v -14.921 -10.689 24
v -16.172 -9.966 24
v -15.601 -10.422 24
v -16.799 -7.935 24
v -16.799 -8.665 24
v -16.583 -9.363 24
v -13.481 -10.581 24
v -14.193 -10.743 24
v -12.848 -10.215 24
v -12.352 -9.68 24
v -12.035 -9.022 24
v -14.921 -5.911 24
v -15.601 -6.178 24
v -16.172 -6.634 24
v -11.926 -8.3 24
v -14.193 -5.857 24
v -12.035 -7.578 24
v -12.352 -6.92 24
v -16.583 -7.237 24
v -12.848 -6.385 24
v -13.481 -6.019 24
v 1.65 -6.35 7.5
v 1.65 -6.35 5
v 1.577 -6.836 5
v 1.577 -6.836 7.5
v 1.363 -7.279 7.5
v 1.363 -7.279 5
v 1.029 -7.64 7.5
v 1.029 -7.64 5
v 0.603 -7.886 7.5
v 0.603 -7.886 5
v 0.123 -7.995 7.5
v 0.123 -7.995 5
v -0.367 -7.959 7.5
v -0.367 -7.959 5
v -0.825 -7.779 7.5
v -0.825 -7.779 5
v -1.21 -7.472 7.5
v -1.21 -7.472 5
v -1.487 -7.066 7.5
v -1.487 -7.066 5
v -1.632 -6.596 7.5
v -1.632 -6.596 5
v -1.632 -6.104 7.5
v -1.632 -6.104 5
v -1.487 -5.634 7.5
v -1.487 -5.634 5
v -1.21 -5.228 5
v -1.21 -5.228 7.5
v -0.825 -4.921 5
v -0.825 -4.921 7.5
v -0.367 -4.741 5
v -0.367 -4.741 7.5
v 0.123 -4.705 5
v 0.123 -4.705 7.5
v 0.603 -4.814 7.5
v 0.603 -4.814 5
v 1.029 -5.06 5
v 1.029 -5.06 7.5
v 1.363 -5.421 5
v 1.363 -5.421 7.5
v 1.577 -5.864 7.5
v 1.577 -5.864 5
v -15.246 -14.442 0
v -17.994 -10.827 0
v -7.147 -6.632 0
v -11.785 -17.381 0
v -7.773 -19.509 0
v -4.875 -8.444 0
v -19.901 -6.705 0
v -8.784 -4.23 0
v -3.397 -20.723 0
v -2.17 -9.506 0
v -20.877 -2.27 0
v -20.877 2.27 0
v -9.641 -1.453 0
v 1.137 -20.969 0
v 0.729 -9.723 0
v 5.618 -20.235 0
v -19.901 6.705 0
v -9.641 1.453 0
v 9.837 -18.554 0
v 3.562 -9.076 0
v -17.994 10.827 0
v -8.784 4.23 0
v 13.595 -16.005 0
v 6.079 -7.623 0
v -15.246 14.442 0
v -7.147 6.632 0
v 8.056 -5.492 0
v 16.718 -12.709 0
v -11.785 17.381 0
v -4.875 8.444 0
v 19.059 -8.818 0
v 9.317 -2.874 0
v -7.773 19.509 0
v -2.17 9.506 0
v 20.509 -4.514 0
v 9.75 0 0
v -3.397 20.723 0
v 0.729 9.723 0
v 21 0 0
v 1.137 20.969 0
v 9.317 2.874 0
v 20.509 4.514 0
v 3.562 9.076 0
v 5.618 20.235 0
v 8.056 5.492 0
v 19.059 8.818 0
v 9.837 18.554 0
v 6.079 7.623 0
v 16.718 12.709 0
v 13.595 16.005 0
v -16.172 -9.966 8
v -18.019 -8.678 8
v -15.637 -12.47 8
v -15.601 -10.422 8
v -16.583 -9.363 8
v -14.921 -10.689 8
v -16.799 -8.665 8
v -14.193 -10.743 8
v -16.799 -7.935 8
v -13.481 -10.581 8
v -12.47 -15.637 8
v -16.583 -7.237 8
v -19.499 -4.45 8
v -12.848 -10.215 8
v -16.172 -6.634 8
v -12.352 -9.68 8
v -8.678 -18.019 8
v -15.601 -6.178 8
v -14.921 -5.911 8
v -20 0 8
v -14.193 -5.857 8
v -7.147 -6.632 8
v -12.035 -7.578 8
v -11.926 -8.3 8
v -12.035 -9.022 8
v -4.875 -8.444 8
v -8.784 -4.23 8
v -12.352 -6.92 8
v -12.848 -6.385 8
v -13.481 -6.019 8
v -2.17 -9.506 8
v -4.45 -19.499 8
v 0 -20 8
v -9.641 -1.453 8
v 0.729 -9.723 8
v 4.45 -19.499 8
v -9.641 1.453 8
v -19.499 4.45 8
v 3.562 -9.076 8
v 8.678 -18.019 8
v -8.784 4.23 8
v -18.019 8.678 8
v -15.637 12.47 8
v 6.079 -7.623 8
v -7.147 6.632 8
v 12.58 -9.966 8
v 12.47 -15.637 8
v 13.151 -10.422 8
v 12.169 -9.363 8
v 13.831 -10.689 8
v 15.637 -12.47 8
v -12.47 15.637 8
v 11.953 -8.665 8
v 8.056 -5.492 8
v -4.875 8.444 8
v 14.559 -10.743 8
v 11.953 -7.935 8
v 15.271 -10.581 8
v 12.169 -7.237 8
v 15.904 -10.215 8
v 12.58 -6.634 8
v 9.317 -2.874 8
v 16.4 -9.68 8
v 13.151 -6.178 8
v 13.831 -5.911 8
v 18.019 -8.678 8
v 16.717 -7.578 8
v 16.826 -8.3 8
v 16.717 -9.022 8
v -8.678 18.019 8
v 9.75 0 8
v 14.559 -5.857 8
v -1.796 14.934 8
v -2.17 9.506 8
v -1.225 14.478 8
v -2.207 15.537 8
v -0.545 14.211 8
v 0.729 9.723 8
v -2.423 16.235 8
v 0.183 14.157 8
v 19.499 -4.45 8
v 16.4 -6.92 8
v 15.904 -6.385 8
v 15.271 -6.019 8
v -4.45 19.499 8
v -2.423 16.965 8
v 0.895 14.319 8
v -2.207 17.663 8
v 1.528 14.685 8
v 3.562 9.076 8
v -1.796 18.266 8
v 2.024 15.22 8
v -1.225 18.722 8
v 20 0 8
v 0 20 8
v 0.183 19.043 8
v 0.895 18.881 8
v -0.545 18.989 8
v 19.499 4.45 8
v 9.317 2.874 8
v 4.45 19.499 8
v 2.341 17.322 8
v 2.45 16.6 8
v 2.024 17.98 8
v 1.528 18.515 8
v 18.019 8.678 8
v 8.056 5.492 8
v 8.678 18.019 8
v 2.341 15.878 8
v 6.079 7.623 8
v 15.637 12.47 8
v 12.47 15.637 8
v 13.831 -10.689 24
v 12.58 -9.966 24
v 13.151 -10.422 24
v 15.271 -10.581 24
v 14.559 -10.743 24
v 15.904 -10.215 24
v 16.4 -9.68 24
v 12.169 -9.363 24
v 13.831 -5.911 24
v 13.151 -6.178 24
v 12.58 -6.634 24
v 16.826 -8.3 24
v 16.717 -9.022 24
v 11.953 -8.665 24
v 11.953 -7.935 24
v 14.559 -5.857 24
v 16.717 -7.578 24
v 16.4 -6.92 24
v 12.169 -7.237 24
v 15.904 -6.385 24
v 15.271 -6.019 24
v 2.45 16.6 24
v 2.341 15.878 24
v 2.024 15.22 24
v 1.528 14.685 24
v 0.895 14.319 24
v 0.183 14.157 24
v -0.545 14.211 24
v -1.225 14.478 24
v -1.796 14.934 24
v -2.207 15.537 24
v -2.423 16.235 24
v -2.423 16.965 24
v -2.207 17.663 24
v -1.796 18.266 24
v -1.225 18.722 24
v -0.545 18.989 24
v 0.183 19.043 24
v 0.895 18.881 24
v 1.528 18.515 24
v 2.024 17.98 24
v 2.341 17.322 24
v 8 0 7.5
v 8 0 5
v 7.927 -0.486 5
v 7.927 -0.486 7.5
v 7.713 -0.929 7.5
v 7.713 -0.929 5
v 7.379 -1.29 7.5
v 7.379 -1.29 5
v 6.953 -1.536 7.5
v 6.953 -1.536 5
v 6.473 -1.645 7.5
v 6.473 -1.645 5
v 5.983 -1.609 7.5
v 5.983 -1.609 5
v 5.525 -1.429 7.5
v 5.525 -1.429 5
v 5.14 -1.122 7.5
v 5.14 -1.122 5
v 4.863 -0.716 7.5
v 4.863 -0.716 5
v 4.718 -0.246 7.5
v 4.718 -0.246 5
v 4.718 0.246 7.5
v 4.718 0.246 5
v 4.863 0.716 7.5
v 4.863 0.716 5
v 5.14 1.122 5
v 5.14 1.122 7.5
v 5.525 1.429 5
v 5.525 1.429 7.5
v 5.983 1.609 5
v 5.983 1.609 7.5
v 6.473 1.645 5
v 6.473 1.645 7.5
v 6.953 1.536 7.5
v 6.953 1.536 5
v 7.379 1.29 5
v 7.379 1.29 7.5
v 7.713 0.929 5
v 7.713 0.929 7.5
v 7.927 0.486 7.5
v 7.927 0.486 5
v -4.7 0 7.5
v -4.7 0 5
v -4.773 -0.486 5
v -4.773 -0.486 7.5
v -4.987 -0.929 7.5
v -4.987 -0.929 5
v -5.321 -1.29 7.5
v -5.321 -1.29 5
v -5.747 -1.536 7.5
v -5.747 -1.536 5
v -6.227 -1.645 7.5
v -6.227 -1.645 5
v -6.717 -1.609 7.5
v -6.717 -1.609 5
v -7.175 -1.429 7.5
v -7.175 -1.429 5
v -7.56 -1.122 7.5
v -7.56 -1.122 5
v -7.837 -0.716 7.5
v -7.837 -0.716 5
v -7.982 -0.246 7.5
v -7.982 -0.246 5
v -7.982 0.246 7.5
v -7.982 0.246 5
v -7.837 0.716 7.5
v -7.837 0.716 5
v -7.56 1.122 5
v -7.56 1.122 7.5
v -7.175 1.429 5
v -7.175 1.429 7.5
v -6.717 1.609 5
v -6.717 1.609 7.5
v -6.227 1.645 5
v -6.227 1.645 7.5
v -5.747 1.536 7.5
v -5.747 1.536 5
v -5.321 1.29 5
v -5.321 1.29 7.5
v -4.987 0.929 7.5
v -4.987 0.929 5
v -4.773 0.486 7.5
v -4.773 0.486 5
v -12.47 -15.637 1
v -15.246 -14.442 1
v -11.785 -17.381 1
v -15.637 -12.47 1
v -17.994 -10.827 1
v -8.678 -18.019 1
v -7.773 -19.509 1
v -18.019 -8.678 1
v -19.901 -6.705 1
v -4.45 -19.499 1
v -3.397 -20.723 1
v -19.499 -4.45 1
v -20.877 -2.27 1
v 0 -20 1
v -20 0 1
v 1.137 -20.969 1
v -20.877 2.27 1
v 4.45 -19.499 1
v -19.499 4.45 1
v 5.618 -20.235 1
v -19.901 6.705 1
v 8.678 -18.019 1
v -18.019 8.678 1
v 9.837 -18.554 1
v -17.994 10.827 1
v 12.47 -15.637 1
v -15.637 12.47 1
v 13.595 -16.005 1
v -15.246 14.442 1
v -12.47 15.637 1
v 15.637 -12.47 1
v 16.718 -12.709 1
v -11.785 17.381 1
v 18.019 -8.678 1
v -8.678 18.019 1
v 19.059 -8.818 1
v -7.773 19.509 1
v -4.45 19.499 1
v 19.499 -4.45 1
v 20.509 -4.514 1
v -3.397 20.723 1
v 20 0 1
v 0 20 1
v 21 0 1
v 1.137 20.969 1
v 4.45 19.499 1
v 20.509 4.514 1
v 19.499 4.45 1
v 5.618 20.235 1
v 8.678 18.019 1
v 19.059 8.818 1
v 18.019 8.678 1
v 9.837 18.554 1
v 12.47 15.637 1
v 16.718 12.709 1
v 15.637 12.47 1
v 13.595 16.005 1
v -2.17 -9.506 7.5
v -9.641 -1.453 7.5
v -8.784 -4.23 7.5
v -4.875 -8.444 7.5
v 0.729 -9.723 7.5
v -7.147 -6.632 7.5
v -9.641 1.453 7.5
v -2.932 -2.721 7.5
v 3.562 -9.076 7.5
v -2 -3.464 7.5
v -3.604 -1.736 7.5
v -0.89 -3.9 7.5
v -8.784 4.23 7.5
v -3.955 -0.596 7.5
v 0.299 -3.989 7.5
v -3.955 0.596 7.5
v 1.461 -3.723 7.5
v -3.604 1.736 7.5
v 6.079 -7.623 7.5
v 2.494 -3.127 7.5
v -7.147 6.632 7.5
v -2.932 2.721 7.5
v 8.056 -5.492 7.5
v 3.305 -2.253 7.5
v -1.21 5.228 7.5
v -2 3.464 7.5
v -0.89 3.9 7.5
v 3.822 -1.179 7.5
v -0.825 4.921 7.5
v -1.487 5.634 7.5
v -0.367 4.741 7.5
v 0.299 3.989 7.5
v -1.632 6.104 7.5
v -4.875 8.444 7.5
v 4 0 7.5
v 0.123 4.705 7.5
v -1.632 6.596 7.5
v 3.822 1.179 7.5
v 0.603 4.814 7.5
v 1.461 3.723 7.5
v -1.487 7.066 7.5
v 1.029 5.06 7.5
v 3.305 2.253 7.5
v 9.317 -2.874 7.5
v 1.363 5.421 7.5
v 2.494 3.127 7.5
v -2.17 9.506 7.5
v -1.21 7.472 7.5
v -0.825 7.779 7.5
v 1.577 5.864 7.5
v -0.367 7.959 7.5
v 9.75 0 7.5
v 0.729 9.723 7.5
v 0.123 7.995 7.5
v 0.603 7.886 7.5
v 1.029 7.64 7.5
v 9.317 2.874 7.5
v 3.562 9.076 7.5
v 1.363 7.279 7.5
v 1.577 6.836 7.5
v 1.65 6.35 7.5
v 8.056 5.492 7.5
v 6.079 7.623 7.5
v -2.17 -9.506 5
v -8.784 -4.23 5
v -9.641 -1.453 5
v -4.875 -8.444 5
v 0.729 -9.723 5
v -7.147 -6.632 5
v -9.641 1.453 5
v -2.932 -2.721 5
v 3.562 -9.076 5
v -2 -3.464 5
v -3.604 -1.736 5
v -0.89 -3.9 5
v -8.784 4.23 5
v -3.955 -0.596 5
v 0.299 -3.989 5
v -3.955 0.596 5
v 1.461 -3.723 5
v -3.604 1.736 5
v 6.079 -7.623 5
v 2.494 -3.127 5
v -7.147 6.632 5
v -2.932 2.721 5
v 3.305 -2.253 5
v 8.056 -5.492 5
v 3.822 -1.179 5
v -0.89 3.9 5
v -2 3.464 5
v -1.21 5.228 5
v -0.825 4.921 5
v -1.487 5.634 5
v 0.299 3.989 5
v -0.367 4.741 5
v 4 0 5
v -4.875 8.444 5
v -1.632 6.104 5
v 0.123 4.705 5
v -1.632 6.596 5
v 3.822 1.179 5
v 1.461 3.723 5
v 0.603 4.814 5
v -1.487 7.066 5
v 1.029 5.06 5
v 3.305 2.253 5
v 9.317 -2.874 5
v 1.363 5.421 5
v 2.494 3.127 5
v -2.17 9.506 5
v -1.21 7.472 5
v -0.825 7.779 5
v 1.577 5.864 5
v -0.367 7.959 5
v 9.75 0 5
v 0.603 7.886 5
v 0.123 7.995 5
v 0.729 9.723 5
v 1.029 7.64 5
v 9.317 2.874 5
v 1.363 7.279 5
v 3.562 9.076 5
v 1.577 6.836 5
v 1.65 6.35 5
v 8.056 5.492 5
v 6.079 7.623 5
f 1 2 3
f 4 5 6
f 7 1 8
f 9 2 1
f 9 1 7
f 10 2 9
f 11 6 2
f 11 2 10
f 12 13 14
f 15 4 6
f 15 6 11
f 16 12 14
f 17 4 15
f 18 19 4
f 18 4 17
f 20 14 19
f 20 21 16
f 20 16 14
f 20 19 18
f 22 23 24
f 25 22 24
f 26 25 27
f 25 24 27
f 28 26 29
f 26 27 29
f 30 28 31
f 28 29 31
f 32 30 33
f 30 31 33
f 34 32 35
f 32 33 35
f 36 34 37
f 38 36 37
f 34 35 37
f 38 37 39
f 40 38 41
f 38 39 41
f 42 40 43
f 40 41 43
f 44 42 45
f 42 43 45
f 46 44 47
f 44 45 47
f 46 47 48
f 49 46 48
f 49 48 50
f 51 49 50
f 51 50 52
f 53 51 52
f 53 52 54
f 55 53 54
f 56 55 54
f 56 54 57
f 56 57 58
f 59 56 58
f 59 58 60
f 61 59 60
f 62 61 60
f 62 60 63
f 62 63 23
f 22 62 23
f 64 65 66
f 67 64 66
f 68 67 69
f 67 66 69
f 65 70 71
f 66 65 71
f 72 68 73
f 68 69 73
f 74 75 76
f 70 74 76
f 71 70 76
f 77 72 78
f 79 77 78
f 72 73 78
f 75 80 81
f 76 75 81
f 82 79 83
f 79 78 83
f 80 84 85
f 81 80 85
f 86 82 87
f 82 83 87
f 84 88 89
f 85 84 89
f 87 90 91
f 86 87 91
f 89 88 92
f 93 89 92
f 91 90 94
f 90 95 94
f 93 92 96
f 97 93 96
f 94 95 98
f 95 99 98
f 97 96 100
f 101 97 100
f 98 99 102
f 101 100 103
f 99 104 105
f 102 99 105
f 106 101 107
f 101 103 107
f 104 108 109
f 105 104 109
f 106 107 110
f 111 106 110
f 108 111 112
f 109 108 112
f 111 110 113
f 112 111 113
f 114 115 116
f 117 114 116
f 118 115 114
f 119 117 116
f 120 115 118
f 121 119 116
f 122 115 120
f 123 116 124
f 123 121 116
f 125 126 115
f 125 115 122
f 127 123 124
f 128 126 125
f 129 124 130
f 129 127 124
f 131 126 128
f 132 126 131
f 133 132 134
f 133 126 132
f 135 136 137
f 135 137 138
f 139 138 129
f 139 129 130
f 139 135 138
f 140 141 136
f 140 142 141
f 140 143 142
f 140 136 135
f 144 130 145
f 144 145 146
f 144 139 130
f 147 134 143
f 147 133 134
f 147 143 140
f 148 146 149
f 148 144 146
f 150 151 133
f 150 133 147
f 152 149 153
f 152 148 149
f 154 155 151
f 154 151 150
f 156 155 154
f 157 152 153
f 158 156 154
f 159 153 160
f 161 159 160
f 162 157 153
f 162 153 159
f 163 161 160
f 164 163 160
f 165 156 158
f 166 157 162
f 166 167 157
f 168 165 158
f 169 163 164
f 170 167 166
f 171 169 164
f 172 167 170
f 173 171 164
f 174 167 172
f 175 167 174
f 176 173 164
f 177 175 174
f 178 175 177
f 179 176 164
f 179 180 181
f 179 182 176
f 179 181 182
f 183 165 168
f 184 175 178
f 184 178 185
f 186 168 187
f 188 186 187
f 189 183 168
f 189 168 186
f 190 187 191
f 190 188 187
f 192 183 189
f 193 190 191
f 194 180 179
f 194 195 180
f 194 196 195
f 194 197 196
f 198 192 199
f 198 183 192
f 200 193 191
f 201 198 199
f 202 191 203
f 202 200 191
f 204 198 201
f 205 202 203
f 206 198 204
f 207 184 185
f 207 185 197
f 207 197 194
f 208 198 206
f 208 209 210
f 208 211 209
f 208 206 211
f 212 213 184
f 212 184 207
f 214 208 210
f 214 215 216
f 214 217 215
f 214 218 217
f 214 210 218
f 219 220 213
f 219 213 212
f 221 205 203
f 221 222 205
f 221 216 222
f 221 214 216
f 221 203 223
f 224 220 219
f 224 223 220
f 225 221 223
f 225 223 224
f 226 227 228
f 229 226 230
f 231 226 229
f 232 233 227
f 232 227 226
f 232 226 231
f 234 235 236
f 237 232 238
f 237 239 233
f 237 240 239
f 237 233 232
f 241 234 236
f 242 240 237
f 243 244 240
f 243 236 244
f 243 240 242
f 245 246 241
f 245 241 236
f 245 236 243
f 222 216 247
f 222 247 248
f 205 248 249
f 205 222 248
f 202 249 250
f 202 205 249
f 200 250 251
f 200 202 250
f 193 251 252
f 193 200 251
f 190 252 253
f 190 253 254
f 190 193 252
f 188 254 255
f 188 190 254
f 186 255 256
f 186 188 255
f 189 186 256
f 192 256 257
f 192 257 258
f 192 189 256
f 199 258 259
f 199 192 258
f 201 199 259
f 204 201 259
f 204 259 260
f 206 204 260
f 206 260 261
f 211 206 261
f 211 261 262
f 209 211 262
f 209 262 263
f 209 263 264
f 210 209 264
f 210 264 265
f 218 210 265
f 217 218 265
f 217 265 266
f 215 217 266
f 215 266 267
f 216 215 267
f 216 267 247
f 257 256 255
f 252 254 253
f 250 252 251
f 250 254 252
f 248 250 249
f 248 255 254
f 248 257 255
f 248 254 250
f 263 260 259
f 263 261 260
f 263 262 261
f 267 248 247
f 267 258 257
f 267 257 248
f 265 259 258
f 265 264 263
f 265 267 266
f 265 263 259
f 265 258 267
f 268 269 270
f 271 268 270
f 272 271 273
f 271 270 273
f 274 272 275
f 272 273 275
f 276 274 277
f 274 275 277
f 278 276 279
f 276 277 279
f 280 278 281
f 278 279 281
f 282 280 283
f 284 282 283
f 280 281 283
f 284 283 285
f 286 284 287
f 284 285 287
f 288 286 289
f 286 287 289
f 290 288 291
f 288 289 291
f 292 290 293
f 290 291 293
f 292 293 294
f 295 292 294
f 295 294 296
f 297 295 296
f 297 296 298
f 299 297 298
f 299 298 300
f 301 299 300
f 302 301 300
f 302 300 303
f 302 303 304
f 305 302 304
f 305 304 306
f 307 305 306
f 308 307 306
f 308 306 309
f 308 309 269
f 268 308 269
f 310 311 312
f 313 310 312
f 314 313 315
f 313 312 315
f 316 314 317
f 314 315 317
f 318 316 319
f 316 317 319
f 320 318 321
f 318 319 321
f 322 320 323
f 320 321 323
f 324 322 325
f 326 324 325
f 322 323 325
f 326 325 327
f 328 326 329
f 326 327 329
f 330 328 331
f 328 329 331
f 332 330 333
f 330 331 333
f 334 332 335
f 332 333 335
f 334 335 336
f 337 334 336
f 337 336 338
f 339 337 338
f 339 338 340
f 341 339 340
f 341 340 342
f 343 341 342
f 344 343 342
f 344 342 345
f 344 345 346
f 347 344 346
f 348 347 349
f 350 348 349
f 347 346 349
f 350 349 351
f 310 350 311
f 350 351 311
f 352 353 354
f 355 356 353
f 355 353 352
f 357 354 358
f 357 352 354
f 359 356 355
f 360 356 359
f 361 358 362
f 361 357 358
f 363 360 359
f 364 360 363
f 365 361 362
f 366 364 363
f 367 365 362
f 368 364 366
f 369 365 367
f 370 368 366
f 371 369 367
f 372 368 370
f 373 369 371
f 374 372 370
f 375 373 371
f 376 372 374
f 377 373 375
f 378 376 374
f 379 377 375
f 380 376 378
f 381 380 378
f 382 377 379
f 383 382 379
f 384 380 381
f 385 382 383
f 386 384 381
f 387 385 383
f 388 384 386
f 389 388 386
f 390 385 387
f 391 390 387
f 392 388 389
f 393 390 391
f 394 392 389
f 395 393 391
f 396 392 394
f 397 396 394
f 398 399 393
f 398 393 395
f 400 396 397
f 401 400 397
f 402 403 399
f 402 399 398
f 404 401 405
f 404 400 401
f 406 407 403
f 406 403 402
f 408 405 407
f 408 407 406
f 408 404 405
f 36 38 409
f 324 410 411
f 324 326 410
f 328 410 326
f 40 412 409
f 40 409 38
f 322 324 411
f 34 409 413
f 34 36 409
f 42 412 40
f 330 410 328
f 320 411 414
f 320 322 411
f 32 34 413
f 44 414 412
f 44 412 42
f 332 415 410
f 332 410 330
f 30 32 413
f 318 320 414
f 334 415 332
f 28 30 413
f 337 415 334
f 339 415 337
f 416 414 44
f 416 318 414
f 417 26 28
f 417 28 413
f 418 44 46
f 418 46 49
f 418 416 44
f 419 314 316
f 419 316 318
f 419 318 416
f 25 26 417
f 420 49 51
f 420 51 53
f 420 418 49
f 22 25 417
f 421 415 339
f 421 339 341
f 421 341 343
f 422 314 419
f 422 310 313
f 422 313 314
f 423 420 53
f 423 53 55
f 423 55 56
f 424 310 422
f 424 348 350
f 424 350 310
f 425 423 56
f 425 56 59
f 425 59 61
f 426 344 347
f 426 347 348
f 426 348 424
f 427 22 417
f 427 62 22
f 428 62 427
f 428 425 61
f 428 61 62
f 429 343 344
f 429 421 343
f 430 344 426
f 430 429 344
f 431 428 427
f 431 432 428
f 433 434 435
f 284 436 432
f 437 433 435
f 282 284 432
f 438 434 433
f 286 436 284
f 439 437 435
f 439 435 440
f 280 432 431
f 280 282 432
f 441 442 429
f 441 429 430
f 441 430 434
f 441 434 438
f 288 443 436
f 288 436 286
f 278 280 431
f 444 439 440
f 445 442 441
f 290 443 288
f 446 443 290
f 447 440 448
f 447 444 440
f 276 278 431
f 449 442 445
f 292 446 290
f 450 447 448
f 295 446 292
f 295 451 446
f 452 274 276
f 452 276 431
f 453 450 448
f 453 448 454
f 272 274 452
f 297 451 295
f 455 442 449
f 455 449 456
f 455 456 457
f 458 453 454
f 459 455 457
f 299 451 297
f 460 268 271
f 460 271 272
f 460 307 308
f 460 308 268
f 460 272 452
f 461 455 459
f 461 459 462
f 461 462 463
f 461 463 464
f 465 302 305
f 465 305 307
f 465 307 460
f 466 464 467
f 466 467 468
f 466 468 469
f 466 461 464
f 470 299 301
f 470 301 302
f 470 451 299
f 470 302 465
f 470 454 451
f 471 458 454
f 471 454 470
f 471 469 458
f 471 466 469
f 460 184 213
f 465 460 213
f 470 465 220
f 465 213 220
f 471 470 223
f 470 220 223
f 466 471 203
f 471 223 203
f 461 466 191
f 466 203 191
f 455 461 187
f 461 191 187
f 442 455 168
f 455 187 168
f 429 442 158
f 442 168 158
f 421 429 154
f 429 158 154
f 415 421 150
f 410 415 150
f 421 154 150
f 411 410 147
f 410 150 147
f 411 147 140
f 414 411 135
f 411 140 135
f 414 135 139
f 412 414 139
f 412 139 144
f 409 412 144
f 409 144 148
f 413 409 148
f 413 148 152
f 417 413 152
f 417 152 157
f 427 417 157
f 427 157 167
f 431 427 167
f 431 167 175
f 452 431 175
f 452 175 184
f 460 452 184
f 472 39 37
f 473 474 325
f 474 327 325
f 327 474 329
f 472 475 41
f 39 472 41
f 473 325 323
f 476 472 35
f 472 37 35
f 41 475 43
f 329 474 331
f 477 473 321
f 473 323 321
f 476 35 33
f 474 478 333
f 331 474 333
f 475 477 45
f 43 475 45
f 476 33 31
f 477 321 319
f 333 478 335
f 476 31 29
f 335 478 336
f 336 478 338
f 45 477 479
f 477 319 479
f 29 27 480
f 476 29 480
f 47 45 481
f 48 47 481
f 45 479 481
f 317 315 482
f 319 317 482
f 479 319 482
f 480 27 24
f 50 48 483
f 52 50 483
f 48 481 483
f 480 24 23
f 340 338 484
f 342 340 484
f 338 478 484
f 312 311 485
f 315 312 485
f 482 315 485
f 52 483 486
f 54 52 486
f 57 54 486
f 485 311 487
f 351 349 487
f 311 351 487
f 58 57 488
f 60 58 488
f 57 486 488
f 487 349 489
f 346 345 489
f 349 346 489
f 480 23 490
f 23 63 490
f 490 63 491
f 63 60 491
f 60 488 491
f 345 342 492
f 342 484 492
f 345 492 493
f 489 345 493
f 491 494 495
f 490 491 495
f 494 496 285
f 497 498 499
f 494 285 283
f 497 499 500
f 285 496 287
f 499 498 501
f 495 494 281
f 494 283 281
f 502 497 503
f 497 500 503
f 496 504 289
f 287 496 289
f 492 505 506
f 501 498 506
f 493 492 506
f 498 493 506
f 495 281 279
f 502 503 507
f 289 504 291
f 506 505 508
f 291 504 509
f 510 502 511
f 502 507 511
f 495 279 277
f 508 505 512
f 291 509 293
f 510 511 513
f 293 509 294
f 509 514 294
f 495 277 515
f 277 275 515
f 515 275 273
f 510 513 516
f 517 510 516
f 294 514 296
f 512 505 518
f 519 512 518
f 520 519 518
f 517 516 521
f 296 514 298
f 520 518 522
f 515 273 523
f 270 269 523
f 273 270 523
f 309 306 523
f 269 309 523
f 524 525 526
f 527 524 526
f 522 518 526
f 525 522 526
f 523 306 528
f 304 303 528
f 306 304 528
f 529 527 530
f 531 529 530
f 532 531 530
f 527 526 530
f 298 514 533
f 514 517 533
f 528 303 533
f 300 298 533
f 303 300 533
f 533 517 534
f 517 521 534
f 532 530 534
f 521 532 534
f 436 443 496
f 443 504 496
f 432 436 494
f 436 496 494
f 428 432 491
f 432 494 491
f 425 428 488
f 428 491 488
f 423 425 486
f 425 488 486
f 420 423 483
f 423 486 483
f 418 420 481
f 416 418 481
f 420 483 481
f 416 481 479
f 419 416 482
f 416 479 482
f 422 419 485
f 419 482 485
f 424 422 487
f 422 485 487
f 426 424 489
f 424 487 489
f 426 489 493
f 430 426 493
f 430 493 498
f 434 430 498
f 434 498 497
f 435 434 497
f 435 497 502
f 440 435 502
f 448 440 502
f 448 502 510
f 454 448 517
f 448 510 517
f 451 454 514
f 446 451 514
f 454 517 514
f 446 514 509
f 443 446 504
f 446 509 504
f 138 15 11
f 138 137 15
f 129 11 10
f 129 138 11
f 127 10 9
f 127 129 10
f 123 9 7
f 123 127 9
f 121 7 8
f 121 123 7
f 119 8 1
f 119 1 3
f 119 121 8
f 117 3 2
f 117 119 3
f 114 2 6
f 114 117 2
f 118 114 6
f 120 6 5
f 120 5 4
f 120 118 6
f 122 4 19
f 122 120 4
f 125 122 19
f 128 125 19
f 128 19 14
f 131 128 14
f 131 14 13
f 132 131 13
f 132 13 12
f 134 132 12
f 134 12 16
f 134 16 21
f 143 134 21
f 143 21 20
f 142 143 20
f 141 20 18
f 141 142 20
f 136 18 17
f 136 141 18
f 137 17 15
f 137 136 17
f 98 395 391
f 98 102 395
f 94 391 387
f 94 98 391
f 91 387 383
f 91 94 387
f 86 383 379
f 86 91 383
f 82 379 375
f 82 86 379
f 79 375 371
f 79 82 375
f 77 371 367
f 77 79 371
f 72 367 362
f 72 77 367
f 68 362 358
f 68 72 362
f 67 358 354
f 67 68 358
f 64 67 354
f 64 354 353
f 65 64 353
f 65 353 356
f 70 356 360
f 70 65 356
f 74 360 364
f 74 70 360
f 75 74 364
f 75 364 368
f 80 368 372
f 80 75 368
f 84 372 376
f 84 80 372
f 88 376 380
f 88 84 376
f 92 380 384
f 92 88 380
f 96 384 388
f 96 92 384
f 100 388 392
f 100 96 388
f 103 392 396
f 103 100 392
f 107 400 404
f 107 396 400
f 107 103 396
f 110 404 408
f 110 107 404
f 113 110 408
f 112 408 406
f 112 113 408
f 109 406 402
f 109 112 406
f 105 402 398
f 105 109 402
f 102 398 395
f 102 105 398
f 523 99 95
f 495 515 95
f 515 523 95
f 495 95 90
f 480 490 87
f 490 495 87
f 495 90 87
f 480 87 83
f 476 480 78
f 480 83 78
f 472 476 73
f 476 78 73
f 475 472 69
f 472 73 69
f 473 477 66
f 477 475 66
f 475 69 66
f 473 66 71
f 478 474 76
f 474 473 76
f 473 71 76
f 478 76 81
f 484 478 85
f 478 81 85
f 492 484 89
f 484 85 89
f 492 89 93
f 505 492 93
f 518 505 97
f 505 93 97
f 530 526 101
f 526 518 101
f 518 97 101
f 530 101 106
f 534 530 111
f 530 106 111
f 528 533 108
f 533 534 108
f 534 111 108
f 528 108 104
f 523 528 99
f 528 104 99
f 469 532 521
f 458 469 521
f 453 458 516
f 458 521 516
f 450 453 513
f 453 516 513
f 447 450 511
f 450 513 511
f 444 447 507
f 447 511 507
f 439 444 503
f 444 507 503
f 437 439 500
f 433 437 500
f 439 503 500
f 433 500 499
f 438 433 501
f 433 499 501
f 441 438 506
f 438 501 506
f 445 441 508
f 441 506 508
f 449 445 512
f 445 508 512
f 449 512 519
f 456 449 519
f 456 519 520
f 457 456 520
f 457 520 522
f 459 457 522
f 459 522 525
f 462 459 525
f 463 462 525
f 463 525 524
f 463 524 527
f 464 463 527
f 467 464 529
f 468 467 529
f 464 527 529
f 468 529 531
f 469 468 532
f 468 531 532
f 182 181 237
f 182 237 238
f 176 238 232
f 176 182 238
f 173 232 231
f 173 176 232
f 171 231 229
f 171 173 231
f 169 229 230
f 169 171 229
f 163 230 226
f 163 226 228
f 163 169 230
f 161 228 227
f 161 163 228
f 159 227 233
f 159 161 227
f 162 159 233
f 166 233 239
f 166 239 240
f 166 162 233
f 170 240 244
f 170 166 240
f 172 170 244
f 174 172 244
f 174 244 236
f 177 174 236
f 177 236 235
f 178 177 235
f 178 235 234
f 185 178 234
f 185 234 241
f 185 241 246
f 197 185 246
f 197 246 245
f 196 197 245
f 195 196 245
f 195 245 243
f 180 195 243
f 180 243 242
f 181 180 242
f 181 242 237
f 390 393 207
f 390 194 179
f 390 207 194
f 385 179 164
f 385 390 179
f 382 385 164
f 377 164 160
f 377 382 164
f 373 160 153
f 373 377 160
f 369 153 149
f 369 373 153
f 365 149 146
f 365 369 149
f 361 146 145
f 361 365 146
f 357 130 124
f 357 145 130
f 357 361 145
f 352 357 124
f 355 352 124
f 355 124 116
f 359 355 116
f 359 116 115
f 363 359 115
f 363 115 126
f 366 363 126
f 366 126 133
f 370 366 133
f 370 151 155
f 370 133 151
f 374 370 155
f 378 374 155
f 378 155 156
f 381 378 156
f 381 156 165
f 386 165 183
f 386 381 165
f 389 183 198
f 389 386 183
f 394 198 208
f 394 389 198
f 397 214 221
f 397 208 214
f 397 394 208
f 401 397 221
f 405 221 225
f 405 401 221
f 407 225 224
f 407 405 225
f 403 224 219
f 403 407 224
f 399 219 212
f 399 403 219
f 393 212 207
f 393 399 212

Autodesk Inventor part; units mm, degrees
ref_plane "YZ Plane" through (0, 0, 0) normal (1, 0, 0) x (0, 1, 0)
ref_plane "XZ Plane" through (0, 0, 0) normal (0, 1, 0) x (-1, 0, 0)
ref_plane "XY Plane" through (0, 0, 0) normal (0, 0, 1) x (1, 0, 0)
sketch "Skizze1" plane through (0, 0, 0) normal (0, 0, 1) x (1, 0, 0)
  line L0 (-29.4, 0) -> (29.4, 0) construction
  circle A0 centre (0, 0) radius 16.6 construction
  line L1 (0, 0) -> (-14.376, -8.3) construction
  line L2 (0, 0) -> (14.376, -8.3) construction
  line L3 (0, 29.4) -> (0, -29.4) construction
  line L4 (0, 0) -> (0, 16.6) construction
  circle A1 centre (0, 0) radius 9.75
  circle A2 centre (0, 0) radius 20
  circle A3 centre (0, 0) radius 6.35 construction
  circle A4 centre (-6.35, 0) radius 1.65
  circle A5 centre (0, 6.35) radius 1.65
  circle A6 centre (6.35, 0) radius 1.65
  circle A7 centre (0, -6.35) radius 1.65
  circle A8 centre (0, 0) radius 21
  circle A9 centre (0, 0) radius 21
  circle A10 centre (-14.376, -8.3) radius 2.45
  circle A11 centre (0, 16.6) radius 2.45
  circle A12 centre (14.376, -8.3) radius 2.45
  circle A13 centre (0, 0) radius 19
  circle A14 centre (0, 0) radius 4
  dimension "d1" = 33.2
  dimension "d2" = 120
  dimension "d13" = 120
  dimension "d14" = 19.5
  dimension "d16" = 40
  dimension "d21" = 6.35
  dimension "d22" = 3.3
  dimension "d26" = 1
  dimension "d27" = 1
  dimension "d30" = 4.9
  dimension "d33" = 1
  dimension "d42" = 8
extrude "Extrusion1" add sketch "Skizze1" along normal blind 1 contours A1 | A2 | A4 | A5 | A6 | A7 | A8 | A10 A13 | A10 A13 A11 A12 | A13 A10 | A13 A11 | A11 A13 | A13 A12 | A12 A13 | A14
extrude "Extrusion3" add sketch "Skizze1" along normal blind 7 from surface at 1 contours A1 | A2 | A4 | A5 | A6 | A7 | A10 A13 | A10 A13 A11 A12 | A13 A10 | A13 A11 | A11 A13 | A13 A12 | A12 A13 | A14
extrude "Extrusion8" add sketch "Skizze1" along normal blind 16 from surface at 8 contours A10 A13 | A13 A10 | A13 A11 | A11 A13 | A13 A12 | A12 A13
extrude "Extrusion9" cut sketch "Skizze1" along normal blind 5 contours A1 | A4 | A5 | A6 | A7 | A14
extrude "Extrusion10" cut sketch "Skizze1" along normal through all contours A4 | A5 | A6 | A7 | A14
extrude "Extrusion11" cut sketch "Skizze1" against normal blind 0.5 from surface at 8 contours A1 | A4 | A5 | A6 | A7 | A14
equation "\"d13\" = d2"
properties part number "Output"
